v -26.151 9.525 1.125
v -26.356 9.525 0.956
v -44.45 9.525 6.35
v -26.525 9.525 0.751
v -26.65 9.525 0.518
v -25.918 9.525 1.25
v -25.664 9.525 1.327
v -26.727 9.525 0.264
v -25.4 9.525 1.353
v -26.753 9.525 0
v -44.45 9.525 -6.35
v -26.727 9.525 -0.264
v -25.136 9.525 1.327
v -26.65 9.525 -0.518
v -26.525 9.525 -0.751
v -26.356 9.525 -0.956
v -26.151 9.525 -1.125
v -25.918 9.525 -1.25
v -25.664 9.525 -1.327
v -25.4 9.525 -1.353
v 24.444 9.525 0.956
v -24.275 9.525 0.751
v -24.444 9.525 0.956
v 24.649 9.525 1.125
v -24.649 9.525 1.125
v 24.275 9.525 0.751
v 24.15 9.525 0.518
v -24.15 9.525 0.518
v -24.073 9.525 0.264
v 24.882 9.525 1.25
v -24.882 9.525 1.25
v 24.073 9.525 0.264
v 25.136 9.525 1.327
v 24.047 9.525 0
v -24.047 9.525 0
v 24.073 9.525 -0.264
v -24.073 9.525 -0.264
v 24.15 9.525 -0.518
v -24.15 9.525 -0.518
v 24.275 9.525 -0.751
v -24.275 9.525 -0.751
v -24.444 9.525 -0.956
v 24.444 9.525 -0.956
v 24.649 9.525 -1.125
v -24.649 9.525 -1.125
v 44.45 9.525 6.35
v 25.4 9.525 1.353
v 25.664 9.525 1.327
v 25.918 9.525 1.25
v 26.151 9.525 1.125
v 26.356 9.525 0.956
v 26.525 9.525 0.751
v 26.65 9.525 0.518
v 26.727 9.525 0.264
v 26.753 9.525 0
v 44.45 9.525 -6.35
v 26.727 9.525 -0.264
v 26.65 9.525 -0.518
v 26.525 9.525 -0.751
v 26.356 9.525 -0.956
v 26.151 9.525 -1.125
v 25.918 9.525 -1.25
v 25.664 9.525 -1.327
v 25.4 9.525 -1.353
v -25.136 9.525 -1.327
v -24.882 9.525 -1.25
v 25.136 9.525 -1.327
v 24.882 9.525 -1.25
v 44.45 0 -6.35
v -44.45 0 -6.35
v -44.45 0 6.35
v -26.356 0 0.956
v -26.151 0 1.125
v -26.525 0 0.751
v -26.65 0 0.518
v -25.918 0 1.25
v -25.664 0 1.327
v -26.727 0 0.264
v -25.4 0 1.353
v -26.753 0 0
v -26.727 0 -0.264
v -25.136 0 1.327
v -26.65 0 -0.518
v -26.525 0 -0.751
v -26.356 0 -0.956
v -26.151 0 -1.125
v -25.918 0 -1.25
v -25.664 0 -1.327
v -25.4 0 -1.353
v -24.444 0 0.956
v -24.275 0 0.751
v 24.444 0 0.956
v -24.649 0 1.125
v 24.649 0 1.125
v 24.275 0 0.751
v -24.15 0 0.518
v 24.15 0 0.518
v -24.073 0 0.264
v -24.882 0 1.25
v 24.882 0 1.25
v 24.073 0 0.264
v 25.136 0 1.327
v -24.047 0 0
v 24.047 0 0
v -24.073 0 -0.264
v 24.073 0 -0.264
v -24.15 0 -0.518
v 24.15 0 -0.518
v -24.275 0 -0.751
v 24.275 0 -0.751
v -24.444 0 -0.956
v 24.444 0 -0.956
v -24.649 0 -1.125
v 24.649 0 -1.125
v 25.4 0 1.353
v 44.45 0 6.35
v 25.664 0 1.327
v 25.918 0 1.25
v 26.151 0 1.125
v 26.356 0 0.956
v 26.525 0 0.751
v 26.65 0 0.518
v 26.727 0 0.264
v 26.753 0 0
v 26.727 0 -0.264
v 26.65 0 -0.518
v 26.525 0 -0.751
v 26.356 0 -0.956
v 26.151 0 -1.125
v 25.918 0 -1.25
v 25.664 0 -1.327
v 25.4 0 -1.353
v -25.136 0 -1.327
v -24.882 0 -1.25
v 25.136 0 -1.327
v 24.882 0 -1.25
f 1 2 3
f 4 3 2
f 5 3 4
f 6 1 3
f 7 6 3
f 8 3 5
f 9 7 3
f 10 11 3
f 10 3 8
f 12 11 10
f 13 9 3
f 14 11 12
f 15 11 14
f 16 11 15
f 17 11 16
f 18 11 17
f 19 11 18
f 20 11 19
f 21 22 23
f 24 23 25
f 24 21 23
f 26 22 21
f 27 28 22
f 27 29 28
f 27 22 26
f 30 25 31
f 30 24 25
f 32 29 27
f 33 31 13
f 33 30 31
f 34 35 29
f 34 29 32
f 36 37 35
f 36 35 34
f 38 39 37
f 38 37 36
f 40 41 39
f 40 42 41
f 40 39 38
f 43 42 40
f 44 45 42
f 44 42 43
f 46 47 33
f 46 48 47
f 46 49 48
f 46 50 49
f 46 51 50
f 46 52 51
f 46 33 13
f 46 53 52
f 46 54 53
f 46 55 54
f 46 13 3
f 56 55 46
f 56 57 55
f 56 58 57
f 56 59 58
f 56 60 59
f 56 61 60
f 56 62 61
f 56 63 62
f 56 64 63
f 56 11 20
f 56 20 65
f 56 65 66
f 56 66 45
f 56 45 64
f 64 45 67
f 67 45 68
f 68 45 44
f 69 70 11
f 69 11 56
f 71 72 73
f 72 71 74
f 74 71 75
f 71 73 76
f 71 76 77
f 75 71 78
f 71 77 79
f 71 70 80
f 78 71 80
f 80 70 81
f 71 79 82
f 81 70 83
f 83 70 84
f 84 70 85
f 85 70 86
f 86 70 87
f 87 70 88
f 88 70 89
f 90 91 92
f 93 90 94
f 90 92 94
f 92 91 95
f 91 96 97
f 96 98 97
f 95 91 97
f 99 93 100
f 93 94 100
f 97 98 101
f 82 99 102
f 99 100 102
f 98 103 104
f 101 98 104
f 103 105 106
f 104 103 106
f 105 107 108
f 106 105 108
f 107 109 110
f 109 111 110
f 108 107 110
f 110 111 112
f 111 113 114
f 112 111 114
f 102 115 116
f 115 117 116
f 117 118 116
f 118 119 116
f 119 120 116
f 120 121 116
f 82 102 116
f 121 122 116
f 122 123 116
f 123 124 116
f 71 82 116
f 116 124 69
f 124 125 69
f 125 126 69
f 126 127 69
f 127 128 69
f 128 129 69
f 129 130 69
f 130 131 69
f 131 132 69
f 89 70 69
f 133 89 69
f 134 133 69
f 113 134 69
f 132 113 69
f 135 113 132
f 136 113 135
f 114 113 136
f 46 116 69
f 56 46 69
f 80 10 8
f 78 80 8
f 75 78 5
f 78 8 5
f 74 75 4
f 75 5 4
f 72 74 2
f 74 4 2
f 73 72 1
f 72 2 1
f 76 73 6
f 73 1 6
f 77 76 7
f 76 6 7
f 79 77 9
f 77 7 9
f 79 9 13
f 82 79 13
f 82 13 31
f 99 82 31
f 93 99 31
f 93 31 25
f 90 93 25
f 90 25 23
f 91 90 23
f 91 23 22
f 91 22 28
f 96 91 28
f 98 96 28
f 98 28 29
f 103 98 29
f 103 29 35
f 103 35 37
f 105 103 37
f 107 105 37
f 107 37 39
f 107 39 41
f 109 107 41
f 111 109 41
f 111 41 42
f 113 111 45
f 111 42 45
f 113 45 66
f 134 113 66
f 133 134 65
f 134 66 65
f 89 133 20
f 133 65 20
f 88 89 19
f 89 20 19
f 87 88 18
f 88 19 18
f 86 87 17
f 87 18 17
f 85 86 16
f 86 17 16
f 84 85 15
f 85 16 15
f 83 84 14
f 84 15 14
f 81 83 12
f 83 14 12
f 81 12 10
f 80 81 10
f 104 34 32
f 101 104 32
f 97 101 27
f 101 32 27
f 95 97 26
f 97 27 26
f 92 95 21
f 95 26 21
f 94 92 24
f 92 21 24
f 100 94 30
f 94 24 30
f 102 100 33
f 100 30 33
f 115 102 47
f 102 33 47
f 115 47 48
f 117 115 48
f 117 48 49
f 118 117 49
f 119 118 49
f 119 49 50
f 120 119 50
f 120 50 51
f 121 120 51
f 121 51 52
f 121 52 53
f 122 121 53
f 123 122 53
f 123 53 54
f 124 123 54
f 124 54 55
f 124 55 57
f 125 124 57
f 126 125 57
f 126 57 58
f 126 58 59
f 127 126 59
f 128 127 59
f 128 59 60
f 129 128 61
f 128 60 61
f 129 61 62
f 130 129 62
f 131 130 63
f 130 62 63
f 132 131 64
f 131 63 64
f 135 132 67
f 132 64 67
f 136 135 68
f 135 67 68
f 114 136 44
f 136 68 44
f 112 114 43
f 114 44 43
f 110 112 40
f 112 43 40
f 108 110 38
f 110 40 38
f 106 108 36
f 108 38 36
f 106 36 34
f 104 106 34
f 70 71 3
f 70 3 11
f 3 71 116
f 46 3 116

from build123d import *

# Parameters (mm, degrees)
SKETCH1_W             = 88.9
SKETCH1_H             = 12.7
BOSS_EXTRUDE1_DEPTH   = 9.525
F_6_32_TAPPED_HOLE1_D = 2.7051


with BuildPart() as part:
    # Sketch1 → Boss-Extrude1 (new body)
    with BuildSketch(Plane(origin=(0, 0, 0), x_dir=(1, 0, 0), z_dir=(0, 1, 0))):
        Rectangle(SKETCH1_W, SKETCH1_H)
    extrude(amount=BOSS_EXTRUDE1_DEPTH)

    # #6-32 Tapped Hole1 (through all)
    with Locations(Plane.XZ):
        with Locations((25.4, 0), (-25.4, 0)):
            Hole(F_6_32_TAPPED_HOLE1_D / 2)


solid = part.part
